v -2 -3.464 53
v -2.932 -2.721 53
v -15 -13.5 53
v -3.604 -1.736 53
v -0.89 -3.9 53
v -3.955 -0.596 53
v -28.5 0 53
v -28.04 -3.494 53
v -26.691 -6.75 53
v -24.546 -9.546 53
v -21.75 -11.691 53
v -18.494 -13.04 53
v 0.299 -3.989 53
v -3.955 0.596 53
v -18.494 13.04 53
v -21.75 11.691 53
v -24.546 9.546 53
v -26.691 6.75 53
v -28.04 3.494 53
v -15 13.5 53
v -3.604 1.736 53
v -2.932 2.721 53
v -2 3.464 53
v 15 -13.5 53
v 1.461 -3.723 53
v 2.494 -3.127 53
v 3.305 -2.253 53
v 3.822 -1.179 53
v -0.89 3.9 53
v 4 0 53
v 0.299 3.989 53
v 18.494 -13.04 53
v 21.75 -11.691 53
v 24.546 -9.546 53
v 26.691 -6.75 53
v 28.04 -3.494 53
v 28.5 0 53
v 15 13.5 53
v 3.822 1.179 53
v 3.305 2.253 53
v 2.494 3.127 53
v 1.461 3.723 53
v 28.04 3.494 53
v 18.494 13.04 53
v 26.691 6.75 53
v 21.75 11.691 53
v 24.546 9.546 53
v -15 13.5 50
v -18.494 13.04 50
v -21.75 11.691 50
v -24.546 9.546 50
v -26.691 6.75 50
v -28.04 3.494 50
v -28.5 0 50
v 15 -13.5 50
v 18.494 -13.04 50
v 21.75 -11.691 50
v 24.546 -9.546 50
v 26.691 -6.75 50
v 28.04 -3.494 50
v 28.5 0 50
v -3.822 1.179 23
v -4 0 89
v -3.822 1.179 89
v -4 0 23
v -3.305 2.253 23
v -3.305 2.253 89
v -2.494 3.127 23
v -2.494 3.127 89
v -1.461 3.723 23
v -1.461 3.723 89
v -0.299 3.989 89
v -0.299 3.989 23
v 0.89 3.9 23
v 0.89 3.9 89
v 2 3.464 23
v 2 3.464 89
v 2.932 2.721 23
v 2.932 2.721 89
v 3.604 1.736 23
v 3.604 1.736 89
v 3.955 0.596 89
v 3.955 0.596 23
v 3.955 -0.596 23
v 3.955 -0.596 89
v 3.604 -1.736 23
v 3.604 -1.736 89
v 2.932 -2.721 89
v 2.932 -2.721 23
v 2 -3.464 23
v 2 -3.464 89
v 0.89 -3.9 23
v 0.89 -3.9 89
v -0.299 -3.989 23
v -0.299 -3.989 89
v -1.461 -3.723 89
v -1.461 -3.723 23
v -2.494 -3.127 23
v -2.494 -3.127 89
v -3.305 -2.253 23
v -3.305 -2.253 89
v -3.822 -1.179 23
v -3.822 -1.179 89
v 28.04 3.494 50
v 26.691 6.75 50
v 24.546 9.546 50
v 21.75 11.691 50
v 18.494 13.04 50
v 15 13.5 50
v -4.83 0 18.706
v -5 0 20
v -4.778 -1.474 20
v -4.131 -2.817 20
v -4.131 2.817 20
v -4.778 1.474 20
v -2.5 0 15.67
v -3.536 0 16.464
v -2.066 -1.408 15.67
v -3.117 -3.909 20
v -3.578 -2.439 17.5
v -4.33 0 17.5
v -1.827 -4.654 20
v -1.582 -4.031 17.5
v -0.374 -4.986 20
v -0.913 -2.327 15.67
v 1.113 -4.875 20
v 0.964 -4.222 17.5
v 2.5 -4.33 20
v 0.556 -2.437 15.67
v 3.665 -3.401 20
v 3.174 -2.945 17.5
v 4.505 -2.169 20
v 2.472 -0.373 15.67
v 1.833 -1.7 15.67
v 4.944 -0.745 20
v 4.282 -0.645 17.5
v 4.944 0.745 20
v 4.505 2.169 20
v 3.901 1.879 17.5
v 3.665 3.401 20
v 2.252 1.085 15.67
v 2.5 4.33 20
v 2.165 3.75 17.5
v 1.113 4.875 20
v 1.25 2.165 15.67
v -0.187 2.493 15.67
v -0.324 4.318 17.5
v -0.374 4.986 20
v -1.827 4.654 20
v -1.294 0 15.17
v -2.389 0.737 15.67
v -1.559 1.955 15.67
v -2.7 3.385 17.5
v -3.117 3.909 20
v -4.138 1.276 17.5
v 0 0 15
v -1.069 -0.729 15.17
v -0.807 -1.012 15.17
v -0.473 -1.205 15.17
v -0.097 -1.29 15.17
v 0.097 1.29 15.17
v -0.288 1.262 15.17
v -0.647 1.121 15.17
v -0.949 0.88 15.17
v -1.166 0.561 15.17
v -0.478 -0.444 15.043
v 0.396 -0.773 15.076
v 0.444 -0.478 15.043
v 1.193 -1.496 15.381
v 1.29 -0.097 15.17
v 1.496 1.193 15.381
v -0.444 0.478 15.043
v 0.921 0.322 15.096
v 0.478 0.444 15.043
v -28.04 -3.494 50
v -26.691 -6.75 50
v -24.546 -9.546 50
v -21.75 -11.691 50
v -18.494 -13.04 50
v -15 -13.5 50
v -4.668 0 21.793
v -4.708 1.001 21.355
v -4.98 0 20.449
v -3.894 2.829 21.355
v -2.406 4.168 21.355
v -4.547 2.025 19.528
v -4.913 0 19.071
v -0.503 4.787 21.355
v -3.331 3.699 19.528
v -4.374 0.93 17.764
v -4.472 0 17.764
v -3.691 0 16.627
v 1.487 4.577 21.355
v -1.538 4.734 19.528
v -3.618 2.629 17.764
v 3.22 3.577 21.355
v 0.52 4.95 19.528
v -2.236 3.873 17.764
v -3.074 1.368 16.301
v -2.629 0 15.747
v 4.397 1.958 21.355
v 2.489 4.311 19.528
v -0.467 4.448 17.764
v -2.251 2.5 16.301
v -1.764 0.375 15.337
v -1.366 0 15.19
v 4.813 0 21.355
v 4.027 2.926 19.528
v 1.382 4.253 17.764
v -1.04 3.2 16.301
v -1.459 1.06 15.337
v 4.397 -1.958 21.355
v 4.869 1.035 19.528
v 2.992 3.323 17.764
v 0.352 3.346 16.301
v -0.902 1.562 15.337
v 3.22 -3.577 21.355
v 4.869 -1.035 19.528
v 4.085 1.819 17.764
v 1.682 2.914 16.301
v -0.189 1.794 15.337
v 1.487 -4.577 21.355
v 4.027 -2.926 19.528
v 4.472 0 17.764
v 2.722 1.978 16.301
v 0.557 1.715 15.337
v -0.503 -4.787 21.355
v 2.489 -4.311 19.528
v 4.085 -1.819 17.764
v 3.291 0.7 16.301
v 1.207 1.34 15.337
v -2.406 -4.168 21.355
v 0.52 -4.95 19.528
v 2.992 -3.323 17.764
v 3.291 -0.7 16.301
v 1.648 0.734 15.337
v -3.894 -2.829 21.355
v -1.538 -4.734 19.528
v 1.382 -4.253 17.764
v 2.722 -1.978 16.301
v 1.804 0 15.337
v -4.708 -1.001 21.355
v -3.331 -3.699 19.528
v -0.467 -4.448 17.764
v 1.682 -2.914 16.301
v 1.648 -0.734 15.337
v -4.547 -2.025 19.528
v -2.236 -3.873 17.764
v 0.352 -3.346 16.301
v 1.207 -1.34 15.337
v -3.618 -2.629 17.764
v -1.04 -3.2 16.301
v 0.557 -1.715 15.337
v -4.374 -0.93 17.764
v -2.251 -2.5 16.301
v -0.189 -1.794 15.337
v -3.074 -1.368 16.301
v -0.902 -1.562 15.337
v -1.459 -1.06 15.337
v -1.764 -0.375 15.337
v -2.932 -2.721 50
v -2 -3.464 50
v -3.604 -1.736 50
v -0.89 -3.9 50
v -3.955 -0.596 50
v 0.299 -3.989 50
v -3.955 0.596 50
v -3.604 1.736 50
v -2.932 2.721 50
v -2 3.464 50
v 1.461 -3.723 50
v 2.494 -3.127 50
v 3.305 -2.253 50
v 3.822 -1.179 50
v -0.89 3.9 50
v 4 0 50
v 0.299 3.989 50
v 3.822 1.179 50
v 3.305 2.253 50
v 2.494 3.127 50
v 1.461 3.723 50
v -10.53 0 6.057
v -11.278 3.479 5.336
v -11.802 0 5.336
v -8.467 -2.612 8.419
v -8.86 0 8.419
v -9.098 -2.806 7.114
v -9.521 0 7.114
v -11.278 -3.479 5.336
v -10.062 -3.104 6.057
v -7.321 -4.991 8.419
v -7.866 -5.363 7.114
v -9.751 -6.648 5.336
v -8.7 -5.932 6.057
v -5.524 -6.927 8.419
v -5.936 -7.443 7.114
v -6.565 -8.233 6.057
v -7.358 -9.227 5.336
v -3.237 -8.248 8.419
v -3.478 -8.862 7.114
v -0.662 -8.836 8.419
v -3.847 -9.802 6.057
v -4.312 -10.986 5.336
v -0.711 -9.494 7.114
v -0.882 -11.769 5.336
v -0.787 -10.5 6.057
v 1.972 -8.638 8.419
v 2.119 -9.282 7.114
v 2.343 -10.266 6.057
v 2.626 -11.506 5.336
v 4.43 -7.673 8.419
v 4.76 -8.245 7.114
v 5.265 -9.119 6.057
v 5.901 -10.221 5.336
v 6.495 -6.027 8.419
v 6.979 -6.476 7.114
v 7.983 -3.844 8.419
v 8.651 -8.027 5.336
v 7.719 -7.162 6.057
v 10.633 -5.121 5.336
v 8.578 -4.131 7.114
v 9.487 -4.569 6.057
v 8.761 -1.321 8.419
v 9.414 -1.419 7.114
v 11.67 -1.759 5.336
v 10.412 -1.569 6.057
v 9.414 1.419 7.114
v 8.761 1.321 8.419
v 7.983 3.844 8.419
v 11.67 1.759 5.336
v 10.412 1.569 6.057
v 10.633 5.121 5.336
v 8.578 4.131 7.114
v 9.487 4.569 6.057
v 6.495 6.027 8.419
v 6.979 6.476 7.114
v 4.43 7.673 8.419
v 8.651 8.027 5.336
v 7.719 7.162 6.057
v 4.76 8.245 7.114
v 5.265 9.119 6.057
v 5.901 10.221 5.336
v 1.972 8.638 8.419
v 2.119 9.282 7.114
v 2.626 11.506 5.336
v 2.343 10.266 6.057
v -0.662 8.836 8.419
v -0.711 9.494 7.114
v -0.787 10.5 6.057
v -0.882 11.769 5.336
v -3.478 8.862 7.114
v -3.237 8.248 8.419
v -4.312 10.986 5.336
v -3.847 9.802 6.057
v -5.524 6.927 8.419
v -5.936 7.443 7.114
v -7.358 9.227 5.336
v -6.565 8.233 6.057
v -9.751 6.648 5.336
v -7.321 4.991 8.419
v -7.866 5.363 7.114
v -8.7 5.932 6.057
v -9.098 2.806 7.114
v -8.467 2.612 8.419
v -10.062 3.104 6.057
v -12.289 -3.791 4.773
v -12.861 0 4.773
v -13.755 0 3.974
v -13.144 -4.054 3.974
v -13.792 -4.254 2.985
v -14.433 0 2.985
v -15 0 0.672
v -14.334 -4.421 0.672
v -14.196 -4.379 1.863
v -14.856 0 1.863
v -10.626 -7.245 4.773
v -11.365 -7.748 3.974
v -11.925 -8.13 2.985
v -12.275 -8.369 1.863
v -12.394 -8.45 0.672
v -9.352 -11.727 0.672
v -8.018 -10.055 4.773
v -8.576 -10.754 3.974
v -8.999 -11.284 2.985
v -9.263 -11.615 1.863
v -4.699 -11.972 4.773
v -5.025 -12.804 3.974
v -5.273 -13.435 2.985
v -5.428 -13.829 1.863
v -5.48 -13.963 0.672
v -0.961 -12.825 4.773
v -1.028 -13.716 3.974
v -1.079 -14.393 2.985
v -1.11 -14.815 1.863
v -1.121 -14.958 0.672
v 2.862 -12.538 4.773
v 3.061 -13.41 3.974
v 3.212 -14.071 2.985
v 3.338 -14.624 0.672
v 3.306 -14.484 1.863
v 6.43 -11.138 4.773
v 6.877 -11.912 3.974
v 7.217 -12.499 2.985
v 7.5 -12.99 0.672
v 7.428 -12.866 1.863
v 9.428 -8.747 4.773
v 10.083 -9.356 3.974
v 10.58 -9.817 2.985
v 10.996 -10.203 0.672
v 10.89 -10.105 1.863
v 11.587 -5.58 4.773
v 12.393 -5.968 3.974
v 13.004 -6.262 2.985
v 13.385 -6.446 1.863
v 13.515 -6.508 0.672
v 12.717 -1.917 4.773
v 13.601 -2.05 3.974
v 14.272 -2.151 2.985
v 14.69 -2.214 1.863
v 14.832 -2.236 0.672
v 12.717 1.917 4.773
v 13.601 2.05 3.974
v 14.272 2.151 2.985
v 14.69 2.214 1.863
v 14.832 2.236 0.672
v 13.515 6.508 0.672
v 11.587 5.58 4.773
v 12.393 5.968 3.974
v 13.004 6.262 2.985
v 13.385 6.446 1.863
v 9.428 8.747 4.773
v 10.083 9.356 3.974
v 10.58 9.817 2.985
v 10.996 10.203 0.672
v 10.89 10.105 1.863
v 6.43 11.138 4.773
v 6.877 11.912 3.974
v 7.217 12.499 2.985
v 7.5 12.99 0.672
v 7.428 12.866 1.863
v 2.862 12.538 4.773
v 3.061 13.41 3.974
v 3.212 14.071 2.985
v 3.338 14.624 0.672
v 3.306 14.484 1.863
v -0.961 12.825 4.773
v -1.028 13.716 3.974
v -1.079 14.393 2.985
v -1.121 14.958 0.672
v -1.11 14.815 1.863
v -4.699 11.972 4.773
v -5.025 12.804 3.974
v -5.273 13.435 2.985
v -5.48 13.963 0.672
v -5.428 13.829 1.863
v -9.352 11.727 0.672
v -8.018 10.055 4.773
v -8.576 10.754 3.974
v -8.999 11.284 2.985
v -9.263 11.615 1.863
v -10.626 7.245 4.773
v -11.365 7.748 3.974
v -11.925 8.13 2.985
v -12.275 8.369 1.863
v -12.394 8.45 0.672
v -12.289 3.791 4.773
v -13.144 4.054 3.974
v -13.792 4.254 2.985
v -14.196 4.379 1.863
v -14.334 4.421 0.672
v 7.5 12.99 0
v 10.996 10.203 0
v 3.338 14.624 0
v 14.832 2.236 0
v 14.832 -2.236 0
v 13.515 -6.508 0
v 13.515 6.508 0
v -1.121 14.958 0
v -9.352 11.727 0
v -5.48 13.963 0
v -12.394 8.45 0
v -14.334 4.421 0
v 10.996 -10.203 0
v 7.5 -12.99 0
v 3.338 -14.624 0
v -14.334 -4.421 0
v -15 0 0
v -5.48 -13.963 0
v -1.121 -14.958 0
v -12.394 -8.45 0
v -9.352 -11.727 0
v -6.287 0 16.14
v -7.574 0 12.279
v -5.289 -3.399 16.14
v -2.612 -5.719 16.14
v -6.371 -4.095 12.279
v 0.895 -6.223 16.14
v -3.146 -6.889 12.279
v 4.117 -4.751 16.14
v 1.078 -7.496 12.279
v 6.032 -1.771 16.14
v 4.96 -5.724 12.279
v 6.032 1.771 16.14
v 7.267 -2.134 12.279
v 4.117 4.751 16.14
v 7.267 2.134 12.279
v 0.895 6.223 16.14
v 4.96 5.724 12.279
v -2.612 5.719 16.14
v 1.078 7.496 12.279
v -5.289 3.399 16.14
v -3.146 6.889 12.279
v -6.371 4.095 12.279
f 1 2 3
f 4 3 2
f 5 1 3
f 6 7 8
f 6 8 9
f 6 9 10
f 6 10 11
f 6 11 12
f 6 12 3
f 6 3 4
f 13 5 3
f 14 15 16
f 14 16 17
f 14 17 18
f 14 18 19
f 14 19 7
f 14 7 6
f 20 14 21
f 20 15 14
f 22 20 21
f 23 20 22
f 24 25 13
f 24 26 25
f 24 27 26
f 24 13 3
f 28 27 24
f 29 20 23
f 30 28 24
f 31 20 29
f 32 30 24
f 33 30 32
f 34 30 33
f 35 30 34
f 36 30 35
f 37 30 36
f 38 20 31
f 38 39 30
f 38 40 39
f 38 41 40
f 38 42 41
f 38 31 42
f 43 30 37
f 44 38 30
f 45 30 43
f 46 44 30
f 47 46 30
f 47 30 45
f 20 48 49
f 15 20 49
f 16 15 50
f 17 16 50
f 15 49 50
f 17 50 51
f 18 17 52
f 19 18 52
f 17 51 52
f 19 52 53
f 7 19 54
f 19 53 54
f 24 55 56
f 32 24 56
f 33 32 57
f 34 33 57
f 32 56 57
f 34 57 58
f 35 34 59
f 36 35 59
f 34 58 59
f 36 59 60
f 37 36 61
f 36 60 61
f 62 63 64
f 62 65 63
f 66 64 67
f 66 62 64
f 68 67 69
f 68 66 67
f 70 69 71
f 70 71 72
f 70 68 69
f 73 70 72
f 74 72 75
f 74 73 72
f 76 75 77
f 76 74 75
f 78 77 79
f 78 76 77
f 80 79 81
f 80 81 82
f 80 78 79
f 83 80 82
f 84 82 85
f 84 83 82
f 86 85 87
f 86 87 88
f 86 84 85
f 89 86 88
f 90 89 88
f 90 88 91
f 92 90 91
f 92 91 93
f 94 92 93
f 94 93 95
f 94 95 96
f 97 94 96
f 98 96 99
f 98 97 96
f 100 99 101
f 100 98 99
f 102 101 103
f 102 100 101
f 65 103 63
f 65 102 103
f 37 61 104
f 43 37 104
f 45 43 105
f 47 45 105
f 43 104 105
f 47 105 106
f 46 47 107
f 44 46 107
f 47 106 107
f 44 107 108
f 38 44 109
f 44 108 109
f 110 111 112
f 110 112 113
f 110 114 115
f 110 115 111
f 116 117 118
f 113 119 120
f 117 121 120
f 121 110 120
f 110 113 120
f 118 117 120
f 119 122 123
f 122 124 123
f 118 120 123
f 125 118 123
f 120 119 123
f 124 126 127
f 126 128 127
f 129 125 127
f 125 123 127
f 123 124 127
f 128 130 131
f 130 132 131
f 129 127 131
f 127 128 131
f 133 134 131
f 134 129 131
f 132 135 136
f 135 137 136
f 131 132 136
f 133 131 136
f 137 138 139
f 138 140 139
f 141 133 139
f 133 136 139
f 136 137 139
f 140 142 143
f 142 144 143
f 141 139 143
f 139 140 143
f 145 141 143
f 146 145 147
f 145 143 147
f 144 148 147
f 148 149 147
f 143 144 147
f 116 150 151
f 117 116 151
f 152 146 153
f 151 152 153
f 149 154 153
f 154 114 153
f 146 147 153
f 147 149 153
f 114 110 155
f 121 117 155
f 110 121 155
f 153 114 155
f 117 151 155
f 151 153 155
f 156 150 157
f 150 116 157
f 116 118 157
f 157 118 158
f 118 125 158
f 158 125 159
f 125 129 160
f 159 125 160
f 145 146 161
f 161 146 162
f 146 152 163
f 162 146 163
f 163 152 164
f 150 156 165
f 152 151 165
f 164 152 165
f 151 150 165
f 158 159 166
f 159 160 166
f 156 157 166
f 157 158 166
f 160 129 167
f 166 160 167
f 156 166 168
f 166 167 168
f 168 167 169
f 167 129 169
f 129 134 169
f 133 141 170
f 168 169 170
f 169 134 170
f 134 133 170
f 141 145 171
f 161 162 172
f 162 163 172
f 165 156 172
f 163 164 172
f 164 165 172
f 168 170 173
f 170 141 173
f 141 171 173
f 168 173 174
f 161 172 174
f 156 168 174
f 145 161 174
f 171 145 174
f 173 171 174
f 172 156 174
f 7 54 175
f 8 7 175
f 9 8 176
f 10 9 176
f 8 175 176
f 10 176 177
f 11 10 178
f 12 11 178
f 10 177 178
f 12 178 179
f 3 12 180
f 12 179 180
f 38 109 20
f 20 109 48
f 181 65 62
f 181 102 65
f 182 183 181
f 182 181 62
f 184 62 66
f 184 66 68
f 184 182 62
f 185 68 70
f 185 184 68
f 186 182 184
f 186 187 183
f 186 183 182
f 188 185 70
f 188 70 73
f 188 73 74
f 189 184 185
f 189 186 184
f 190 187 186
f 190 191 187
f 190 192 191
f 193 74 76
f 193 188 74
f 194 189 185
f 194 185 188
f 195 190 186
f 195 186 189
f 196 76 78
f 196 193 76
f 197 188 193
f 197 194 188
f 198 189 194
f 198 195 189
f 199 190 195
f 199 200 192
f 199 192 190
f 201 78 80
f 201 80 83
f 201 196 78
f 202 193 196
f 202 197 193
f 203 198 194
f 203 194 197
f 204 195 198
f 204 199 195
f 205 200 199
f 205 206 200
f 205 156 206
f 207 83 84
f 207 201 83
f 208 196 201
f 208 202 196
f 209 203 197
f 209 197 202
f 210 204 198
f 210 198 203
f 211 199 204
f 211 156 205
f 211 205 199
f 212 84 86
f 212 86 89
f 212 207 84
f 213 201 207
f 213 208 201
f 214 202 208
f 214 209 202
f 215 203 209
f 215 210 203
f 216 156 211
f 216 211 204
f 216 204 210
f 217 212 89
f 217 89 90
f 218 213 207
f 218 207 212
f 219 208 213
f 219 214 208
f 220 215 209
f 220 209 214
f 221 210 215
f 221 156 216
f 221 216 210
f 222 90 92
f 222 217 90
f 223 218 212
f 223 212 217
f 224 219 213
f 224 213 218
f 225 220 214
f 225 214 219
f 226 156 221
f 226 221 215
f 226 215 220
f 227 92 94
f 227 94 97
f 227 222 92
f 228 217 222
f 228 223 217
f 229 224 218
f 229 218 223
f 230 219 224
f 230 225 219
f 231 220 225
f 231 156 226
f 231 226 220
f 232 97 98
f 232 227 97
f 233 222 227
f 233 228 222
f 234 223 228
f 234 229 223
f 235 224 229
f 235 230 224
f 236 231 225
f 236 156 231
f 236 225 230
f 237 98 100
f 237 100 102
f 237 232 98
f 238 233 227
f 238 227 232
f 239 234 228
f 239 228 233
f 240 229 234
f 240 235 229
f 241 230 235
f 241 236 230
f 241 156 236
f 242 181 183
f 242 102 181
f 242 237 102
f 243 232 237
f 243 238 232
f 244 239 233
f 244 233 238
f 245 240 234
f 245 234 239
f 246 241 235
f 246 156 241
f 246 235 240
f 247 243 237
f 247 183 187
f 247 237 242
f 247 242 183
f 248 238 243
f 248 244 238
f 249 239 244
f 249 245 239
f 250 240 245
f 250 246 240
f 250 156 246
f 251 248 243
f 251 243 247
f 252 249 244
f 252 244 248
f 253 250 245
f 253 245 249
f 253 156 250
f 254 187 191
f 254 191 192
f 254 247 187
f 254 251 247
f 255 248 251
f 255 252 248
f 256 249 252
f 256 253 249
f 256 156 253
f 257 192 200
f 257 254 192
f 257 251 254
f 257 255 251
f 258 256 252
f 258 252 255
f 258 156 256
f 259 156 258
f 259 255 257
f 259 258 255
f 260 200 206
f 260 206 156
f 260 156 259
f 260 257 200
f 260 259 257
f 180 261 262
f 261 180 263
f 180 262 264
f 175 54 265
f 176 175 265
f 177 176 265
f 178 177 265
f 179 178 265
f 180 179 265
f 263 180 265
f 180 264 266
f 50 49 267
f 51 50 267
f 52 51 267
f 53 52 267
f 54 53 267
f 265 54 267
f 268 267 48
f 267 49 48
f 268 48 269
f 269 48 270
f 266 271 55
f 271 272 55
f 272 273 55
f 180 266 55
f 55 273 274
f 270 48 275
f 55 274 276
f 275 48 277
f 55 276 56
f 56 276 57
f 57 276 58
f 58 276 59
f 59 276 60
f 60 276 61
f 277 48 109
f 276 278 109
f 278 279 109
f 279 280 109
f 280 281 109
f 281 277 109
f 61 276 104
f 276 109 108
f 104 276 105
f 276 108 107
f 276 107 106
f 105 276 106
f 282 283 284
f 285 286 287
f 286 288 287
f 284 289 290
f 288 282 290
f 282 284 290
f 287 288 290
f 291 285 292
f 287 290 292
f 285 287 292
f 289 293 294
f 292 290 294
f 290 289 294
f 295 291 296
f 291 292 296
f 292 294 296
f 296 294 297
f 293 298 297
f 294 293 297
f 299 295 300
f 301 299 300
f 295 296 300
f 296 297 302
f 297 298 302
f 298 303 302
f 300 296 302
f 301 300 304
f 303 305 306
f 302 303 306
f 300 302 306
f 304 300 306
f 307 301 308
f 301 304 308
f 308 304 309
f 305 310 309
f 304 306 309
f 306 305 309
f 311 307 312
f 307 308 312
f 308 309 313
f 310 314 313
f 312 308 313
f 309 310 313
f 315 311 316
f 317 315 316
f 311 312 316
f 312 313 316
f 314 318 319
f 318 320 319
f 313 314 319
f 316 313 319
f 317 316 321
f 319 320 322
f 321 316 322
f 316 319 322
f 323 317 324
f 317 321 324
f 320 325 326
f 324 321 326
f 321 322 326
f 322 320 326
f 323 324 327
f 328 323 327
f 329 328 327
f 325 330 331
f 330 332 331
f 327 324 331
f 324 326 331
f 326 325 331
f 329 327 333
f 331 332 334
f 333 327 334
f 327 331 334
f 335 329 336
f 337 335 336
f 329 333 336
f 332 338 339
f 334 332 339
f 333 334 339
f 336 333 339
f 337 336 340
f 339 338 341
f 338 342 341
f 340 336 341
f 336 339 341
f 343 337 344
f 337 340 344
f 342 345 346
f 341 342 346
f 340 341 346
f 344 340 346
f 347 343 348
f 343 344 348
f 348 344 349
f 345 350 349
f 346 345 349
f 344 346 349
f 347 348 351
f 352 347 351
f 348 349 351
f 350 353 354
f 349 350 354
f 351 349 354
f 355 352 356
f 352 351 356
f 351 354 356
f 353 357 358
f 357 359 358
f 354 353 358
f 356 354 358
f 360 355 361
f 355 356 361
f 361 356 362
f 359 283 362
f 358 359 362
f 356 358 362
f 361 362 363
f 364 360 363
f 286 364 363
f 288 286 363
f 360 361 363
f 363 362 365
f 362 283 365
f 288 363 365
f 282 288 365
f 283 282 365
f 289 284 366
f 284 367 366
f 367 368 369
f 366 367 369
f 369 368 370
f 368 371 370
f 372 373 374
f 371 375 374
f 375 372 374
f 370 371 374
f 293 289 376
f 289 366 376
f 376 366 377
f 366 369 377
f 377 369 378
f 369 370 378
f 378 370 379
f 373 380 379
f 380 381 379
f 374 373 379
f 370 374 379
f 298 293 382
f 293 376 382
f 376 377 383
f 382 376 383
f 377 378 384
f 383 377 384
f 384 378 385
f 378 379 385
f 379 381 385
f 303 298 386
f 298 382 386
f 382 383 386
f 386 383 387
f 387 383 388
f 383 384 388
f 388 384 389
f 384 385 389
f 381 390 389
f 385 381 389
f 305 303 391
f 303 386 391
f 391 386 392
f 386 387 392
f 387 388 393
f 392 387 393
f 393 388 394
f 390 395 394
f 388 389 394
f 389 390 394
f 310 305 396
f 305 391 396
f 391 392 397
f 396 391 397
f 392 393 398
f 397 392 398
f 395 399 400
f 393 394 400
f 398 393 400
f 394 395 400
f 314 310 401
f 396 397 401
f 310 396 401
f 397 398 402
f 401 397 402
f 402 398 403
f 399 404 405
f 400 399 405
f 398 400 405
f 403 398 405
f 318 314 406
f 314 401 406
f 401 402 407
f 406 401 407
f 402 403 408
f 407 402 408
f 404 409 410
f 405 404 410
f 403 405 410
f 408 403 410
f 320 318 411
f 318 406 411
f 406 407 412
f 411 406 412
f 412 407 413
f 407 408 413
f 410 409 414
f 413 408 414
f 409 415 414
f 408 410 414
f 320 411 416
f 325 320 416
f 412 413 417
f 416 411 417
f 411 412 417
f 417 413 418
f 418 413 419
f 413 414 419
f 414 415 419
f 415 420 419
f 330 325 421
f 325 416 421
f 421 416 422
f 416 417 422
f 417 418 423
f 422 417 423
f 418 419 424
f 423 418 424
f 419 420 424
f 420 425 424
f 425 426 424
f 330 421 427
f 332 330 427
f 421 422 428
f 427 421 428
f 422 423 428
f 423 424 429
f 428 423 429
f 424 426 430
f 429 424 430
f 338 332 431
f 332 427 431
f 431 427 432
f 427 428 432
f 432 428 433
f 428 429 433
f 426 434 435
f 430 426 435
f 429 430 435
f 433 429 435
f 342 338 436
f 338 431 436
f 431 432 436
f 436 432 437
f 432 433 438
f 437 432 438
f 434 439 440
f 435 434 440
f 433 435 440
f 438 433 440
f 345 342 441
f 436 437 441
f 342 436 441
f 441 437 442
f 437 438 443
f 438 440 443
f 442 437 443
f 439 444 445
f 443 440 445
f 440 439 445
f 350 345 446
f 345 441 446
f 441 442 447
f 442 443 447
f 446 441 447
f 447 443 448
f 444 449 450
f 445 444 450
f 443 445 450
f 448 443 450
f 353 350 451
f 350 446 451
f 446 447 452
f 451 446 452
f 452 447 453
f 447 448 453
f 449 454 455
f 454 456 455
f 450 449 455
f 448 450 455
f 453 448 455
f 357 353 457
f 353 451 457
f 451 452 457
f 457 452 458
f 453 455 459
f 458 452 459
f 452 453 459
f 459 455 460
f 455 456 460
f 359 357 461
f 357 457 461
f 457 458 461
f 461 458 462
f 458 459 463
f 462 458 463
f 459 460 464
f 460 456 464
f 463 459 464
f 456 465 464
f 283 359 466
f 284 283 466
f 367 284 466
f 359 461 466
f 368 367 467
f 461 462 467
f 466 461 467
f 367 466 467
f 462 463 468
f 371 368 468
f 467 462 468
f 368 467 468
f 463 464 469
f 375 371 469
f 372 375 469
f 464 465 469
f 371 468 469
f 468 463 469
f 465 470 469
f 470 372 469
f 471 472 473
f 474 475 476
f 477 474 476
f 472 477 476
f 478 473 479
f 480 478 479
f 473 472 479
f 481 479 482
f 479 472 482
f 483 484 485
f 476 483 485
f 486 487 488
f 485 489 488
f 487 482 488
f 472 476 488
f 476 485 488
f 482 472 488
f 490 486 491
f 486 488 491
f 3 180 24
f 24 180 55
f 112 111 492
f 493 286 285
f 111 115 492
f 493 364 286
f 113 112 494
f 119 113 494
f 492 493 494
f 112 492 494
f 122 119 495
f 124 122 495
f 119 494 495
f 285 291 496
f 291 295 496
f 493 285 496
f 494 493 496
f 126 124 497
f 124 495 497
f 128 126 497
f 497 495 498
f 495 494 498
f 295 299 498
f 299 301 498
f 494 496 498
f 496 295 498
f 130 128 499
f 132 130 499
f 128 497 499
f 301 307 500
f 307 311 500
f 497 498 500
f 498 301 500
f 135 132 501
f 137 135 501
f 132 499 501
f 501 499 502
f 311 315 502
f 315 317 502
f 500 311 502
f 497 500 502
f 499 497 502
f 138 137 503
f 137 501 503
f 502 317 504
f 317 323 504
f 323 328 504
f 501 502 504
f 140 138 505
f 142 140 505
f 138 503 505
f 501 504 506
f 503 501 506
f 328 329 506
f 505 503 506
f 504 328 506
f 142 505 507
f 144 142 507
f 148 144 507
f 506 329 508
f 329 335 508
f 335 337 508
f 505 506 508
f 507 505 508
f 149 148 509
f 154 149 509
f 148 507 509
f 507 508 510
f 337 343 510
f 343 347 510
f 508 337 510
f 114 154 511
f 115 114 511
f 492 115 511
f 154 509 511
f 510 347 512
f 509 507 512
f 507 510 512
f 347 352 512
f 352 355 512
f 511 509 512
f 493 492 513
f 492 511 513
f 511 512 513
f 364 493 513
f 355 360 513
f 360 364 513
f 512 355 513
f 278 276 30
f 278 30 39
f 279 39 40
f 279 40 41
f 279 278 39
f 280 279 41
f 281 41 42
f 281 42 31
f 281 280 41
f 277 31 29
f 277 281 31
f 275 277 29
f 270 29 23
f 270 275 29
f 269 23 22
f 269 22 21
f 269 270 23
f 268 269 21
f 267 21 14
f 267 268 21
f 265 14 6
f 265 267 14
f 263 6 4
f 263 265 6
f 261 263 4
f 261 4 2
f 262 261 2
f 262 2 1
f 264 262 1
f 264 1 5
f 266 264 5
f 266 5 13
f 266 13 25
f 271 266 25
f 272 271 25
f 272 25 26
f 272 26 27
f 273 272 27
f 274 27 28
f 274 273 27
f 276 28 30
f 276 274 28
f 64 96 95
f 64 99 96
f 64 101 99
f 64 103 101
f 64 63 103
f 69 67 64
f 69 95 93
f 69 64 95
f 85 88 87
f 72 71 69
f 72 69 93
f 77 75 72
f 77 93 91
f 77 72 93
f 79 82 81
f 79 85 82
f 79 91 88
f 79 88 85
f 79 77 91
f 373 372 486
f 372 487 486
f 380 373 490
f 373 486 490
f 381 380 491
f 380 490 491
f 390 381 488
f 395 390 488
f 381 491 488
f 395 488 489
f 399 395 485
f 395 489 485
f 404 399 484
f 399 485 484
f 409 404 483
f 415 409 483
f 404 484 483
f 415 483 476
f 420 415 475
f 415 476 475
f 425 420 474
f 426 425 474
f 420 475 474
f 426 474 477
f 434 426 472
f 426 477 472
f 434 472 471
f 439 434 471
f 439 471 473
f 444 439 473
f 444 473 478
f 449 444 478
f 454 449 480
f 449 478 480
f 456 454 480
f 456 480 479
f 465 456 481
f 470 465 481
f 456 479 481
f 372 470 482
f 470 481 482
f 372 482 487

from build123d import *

# Parameters (mm, degrees)
F5_R     = 4
F6_DEPTH = 3


with BuildPart() as f1:
    # F0 (on Front) → F1 (revolve)
    with BuildSketch(Plane.XZ):
        with BuildLine():
            Line((-15, 0), (0, 0))
            Line((0, 0), (0, 15))
            ThreePointArc((0, 15), (-3.535534, 16.464466), (-5, 20))
            Line((-5, 20), (-8.86038, 8.418861))
            ThreePointArc((-8.86038, 8.418861), (-9.986292, 6.548383), (-11.801898, 5.335971))
            ThreePointArc((-11.801898, 5.335971), (-14.123681, 3.499531), (-15, 0.671943))
            Line((-15, 0.671943), (-15, 0))
        make_face()
    revolve(axis=Axis((0, 0, 10), (0, 0, 1)))


with BuildPart() as f3:
    # F2 (on Front) → F3 (revolve)
    with BuildSketch(Plane.XZ):
        with BuildLine():
            Line((-4, 89), (-4, 23))
            ThreePointArc((-4, 23), (-4.472136, 17.763932), (0, 15))
            Line((0, 15), (0, 25))
            Line((0, 25), (0, 89))
            Line((0, 89), (-4, 89))
        make_face()
    revolve(axis=Axis((0, 0, 20), (0, 0, -1)))


with BuildPart() as f6:
    # F5 (on offset) → F6 (new body)
    with BuildSketch(Plane.XY.offset(50)):
        with BuildLine():
            Line((15, 13.5), (-15, 13.5))
            ThreePointArc((-15, 13.5), (-24.545942, 9.545942), (-28.5, 0))
            ThreePointArc((-28.5, 0), (-24.545942, -9.545942), (-15, -13.5))
            Line((-15, -13.5), (15, -13.5))
            ThreePointArc((15, -13.5), (24.545942, -9.545942), (28.5, 0))
            ThreePointArc((28.5, 0), (24.545942, 9.545942), (15, 13.5))
        make_face()
        Circle(F5_R, mode=Mode.SUBTRACT)
    extrude(amount=F6_DEPTH)


solid = Compound([f1.part, f3.part, f6.part])
